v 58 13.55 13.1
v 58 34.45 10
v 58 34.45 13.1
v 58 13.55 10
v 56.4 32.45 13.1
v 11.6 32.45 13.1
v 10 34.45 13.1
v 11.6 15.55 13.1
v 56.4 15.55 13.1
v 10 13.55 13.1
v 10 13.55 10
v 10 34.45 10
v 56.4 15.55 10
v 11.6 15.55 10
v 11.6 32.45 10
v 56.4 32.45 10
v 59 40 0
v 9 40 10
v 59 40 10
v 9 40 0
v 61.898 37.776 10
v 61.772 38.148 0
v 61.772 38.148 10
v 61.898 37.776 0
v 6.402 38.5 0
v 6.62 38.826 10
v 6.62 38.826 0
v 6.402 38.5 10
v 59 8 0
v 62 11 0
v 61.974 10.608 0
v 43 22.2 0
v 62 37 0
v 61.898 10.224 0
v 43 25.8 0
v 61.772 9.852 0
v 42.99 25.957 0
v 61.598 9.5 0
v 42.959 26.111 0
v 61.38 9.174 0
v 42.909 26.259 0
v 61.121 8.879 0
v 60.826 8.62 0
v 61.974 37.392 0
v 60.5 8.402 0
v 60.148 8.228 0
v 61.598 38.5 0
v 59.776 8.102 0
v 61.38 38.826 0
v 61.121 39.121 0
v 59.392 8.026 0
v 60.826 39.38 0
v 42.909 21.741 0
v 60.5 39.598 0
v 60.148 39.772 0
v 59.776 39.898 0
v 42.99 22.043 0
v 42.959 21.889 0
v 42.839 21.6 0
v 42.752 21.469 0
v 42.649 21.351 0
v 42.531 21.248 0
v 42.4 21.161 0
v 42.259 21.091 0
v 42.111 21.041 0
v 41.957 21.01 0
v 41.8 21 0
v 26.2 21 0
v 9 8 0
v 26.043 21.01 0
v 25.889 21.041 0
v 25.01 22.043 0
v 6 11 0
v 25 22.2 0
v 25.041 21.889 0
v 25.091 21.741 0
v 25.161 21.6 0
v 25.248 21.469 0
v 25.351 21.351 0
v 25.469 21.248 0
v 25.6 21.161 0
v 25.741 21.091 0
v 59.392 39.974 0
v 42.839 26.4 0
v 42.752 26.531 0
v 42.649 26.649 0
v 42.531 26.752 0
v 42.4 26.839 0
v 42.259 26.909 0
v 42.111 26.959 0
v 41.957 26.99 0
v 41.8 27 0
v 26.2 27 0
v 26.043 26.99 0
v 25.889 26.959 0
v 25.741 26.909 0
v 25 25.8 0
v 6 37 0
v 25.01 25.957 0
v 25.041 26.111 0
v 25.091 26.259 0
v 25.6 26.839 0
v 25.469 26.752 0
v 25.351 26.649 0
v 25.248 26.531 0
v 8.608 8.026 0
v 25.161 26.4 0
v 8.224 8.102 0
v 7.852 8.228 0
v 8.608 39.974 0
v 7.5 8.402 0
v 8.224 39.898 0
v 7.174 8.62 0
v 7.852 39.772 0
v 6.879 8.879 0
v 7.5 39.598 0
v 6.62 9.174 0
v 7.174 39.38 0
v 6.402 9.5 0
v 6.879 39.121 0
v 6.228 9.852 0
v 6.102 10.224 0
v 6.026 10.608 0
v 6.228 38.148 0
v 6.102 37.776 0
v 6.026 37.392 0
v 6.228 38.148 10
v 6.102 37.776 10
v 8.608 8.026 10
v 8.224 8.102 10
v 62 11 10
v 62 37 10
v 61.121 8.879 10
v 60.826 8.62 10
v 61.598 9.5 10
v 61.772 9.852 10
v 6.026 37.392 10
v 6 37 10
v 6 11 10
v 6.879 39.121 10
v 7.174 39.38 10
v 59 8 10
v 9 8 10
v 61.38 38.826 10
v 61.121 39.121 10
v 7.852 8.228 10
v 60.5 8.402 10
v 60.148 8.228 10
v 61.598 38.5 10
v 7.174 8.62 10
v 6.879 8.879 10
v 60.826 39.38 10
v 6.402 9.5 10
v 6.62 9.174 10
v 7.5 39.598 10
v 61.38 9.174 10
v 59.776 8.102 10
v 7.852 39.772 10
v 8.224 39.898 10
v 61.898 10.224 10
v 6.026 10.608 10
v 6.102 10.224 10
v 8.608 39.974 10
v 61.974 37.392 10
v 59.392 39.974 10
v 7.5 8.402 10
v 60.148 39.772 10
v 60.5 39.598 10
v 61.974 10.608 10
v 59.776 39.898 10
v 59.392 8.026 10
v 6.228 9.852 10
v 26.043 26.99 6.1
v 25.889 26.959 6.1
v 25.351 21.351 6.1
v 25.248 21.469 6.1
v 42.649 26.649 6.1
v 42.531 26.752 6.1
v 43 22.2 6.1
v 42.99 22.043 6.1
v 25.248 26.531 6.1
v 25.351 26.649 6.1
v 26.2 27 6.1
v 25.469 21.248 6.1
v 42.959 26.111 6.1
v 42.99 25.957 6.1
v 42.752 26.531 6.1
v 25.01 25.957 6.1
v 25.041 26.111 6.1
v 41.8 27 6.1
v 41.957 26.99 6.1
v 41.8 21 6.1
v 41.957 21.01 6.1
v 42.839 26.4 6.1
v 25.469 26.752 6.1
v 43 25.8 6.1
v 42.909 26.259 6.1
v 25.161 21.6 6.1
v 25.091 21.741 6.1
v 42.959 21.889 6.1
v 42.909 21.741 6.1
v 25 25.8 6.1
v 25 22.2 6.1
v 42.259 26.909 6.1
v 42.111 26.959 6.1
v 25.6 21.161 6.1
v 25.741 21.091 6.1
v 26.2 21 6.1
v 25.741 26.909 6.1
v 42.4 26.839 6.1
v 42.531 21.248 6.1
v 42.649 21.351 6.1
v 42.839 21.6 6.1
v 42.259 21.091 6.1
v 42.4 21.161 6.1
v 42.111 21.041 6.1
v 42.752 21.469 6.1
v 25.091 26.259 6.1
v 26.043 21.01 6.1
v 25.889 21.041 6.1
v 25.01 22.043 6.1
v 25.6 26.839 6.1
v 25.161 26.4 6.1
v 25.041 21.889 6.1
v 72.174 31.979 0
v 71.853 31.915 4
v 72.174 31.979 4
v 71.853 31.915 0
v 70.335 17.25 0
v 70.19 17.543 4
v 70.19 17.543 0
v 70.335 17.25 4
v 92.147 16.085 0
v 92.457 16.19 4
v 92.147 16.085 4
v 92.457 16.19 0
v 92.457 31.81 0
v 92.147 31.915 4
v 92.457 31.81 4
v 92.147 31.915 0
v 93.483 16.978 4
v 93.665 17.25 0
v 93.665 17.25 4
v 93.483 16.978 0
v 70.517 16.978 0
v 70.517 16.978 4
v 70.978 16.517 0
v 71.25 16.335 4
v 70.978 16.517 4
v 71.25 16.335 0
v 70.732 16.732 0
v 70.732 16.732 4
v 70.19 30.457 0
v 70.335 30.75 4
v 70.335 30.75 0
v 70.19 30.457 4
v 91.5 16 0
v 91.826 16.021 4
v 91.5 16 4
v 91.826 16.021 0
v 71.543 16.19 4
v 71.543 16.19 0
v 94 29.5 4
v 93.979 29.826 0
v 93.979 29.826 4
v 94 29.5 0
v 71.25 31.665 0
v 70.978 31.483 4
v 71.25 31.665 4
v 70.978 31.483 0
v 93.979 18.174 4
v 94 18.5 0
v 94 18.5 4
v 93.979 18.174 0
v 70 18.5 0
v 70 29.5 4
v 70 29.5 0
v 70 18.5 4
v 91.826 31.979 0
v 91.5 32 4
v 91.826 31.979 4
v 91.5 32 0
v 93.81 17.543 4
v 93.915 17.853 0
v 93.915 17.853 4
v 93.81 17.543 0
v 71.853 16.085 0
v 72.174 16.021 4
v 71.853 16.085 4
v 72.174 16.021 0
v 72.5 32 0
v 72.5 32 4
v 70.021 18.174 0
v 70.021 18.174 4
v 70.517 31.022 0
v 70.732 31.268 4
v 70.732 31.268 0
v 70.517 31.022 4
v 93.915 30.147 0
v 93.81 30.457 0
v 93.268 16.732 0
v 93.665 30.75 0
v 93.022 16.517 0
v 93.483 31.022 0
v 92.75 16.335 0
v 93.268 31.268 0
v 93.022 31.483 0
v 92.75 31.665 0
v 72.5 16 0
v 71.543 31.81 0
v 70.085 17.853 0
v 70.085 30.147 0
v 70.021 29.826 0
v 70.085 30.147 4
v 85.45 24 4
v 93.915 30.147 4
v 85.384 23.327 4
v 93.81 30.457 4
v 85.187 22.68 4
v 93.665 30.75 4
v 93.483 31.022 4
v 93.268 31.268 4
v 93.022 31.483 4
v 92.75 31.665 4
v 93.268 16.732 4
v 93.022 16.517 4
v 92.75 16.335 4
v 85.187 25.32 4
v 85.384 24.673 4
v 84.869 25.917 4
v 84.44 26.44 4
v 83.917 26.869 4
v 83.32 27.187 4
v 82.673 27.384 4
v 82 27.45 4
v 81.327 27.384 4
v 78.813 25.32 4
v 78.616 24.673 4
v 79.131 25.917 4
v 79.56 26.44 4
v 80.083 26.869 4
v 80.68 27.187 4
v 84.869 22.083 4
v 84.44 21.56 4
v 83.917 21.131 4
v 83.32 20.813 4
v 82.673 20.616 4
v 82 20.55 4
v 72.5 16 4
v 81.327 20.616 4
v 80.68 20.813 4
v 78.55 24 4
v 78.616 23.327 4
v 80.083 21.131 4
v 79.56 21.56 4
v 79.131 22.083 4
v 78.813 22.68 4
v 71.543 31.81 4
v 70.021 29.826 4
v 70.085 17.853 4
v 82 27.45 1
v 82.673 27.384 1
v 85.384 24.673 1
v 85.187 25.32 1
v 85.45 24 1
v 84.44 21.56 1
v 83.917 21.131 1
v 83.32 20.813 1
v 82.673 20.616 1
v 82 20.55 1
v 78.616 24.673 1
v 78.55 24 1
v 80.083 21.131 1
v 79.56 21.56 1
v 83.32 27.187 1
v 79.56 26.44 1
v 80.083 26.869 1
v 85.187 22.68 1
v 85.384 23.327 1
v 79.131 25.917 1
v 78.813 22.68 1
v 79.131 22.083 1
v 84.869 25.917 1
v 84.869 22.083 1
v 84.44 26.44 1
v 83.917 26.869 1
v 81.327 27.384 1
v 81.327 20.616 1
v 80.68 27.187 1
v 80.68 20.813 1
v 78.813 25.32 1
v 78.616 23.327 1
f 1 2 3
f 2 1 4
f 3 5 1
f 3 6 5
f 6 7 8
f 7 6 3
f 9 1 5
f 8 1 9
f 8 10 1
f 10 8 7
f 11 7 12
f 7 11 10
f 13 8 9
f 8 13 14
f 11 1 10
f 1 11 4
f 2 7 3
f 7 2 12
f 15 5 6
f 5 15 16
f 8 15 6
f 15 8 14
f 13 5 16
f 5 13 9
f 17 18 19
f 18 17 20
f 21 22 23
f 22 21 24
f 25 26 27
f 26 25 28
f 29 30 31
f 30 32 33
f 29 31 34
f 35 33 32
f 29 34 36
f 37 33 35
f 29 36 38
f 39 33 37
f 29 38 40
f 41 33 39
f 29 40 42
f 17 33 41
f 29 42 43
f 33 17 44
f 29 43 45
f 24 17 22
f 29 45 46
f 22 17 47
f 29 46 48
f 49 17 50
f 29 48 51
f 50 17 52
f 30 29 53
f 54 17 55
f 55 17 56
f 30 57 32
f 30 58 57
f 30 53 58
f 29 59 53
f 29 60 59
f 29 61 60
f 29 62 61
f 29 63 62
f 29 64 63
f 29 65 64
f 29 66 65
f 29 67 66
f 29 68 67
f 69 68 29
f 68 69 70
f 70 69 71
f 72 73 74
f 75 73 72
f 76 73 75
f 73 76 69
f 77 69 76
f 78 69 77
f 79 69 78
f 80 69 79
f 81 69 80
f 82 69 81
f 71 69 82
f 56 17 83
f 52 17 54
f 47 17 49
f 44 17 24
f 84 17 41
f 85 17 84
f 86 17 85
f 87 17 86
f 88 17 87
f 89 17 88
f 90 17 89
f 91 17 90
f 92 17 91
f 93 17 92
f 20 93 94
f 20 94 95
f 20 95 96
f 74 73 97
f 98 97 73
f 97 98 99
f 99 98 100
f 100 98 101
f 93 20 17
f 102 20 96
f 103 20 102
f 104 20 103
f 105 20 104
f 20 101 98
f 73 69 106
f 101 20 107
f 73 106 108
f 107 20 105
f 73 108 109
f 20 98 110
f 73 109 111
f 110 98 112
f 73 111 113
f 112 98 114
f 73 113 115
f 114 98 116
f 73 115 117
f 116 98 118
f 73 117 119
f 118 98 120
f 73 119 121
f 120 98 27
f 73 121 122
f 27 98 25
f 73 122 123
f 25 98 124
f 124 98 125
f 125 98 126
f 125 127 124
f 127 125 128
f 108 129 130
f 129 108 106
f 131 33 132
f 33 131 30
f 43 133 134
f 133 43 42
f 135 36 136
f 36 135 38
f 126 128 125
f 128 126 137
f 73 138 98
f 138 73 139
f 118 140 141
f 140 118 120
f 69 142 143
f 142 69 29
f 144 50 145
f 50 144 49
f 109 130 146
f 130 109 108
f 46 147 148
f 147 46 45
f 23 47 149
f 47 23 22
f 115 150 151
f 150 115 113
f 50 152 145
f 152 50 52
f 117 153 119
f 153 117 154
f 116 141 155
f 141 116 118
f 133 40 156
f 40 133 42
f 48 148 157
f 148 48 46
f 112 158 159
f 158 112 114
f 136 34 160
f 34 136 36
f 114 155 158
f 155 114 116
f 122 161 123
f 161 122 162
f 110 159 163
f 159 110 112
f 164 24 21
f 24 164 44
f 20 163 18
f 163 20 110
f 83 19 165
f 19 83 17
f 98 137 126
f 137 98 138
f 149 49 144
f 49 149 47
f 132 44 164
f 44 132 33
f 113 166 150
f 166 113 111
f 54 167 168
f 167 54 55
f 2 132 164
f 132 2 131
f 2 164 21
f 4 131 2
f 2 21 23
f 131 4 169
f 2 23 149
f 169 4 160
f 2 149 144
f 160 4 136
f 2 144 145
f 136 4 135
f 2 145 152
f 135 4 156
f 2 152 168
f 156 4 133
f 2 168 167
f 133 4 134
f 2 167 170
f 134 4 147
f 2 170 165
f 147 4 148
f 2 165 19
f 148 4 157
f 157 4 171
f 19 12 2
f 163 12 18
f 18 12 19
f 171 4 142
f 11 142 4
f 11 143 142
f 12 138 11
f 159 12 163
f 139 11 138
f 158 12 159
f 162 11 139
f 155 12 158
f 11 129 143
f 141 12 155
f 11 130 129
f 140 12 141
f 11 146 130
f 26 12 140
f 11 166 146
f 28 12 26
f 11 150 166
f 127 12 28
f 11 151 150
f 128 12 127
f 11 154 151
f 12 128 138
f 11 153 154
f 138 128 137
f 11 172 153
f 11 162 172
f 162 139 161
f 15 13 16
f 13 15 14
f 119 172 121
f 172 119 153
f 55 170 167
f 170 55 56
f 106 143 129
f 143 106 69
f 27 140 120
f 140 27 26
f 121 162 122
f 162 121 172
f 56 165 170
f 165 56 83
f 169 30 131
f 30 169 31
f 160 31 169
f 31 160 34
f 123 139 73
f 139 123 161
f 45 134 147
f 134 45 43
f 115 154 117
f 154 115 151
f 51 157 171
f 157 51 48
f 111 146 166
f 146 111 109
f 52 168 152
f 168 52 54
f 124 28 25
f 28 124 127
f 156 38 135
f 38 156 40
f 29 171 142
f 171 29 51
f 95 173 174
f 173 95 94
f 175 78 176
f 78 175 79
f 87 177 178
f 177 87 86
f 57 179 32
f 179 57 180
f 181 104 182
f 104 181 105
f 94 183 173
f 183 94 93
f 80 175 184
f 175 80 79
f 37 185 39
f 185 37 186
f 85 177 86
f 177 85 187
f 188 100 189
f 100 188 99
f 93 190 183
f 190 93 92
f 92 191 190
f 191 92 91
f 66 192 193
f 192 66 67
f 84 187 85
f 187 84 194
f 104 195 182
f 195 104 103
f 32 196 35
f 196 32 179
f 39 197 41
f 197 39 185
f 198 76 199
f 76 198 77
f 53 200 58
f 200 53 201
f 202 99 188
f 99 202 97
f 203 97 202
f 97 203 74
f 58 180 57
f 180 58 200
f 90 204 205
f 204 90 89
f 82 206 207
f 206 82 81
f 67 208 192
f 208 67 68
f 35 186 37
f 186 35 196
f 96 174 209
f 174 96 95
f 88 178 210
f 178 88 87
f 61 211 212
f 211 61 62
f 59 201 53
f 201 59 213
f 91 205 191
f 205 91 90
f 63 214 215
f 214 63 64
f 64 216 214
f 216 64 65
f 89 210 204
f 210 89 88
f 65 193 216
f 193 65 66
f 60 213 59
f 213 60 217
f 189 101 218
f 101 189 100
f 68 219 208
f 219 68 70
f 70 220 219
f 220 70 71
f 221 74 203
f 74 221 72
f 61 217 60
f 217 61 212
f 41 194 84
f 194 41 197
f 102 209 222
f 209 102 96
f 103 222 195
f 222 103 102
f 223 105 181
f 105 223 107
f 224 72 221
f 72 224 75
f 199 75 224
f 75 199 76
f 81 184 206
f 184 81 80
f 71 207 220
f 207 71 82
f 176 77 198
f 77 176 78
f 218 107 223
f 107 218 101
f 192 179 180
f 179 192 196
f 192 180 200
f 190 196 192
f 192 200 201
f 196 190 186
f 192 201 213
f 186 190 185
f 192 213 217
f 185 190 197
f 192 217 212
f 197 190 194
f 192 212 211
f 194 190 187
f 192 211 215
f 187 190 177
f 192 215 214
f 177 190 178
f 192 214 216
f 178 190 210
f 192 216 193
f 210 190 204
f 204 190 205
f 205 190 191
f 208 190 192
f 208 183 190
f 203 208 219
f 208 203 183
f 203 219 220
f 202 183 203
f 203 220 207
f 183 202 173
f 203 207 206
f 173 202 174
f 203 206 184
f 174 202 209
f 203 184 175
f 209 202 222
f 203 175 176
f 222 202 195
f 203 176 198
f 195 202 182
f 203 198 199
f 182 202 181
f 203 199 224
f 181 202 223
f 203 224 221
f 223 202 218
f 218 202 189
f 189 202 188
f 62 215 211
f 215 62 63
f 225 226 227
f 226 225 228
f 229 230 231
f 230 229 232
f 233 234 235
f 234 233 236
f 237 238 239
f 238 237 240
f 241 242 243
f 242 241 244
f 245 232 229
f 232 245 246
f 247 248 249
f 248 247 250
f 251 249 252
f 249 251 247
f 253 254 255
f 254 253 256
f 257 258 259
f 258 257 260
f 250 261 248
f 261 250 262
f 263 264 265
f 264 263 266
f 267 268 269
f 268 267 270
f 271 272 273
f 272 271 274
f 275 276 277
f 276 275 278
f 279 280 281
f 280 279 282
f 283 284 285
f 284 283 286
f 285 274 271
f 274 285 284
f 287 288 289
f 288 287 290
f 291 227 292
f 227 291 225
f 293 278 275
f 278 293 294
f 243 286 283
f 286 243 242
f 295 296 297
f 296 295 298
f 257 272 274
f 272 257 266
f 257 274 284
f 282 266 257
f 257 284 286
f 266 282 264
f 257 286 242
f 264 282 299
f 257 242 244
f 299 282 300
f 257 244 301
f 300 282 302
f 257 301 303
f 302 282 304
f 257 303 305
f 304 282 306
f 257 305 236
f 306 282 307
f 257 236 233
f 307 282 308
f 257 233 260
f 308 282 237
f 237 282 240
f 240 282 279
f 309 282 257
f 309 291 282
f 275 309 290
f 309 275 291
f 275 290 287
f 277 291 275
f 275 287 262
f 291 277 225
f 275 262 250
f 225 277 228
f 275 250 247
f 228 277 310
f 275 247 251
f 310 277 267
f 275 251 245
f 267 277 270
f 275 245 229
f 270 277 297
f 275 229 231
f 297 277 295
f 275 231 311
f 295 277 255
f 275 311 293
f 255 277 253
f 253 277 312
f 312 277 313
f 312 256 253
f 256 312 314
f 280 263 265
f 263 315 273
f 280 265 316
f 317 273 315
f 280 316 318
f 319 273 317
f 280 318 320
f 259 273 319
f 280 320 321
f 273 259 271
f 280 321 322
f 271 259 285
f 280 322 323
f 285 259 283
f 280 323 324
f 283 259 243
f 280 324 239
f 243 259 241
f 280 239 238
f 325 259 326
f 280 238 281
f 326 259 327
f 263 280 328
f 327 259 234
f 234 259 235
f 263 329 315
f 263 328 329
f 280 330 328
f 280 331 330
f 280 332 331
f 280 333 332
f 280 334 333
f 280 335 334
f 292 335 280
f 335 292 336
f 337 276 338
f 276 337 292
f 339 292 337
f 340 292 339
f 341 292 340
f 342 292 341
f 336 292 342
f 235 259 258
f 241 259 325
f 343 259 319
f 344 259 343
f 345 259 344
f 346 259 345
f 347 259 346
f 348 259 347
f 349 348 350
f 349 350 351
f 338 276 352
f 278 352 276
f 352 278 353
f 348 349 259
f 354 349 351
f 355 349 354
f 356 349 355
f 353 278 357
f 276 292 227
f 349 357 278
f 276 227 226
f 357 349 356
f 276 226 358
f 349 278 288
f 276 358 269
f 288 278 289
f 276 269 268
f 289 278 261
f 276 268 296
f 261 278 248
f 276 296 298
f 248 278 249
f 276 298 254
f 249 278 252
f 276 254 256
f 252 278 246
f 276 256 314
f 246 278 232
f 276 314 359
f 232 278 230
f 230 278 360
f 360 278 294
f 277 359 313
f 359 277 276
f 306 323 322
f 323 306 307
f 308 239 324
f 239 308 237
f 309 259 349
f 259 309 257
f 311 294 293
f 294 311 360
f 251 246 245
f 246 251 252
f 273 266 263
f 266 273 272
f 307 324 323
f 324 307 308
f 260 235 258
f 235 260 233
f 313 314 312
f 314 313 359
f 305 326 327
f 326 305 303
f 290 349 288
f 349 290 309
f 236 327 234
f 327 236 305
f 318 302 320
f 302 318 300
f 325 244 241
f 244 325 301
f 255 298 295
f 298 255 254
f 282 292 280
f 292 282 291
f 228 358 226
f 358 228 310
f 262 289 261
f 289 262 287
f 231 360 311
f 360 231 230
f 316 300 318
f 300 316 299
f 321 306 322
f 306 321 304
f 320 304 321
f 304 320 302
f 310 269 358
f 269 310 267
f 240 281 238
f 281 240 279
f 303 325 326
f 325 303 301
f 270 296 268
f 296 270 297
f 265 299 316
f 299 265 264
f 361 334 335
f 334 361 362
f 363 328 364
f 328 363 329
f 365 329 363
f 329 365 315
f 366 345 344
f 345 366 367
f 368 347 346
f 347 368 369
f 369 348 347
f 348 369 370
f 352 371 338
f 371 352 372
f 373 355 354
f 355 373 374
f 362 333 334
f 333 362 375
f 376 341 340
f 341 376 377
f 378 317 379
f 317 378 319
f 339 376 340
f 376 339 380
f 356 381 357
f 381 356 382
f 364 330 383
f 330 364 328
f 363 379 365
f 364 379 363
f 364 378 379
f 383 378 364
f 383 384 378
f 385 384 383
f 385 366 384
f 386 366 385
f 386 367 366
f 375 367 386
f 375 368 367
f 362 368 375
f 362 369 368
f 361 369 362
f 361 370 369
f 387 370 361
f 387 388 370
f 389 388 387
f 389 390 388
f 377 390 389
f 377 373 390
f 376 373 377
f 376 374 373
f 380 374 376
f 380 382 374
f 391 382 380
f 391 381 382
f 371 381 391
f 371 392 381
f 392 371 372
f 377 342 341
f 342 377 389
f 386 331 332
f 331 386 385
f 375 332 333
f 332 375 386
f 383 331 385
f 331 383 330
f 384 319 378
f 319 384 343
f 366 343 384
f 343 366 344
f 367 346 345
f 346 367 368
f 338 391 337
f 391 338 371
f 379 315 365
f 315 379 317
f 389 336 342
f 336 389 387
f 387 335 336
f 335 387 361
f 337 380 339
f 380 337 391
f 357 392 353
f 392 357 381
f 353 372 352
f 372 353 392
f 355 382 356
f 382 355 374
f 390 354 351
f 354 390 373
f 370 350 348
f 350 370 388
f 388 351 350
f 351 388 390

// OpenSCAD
/*
Sample 156: Abgedichtete Magnetbetätiger-Tasche — Wand 4 mm
Generated from the FDM Mechanical Sample Library.
Units: millimetres.

Override examples:
  openscad -o custom.stl -D 'view="plate"' -D 'render_fn=64' model.scad
  openscad -o preview.png -D 'view="assembly"' model.scad
*/
use <../../../library/fdm_mechanisms.scad>

render_fn = is_undef(render_fn) ? 48 : render_fn;
view = is_undef(view) ? "plate" : view;
$fn = render_fn;

sample_magnetic_actuator(
    view=view,
    wall_t=4,
    magnet_d=6,
    magnet_l=3,
    switch_keepout=[18, 6, 6],
    travel=24,
    retention=1.6,
    clearance=0.45
);
